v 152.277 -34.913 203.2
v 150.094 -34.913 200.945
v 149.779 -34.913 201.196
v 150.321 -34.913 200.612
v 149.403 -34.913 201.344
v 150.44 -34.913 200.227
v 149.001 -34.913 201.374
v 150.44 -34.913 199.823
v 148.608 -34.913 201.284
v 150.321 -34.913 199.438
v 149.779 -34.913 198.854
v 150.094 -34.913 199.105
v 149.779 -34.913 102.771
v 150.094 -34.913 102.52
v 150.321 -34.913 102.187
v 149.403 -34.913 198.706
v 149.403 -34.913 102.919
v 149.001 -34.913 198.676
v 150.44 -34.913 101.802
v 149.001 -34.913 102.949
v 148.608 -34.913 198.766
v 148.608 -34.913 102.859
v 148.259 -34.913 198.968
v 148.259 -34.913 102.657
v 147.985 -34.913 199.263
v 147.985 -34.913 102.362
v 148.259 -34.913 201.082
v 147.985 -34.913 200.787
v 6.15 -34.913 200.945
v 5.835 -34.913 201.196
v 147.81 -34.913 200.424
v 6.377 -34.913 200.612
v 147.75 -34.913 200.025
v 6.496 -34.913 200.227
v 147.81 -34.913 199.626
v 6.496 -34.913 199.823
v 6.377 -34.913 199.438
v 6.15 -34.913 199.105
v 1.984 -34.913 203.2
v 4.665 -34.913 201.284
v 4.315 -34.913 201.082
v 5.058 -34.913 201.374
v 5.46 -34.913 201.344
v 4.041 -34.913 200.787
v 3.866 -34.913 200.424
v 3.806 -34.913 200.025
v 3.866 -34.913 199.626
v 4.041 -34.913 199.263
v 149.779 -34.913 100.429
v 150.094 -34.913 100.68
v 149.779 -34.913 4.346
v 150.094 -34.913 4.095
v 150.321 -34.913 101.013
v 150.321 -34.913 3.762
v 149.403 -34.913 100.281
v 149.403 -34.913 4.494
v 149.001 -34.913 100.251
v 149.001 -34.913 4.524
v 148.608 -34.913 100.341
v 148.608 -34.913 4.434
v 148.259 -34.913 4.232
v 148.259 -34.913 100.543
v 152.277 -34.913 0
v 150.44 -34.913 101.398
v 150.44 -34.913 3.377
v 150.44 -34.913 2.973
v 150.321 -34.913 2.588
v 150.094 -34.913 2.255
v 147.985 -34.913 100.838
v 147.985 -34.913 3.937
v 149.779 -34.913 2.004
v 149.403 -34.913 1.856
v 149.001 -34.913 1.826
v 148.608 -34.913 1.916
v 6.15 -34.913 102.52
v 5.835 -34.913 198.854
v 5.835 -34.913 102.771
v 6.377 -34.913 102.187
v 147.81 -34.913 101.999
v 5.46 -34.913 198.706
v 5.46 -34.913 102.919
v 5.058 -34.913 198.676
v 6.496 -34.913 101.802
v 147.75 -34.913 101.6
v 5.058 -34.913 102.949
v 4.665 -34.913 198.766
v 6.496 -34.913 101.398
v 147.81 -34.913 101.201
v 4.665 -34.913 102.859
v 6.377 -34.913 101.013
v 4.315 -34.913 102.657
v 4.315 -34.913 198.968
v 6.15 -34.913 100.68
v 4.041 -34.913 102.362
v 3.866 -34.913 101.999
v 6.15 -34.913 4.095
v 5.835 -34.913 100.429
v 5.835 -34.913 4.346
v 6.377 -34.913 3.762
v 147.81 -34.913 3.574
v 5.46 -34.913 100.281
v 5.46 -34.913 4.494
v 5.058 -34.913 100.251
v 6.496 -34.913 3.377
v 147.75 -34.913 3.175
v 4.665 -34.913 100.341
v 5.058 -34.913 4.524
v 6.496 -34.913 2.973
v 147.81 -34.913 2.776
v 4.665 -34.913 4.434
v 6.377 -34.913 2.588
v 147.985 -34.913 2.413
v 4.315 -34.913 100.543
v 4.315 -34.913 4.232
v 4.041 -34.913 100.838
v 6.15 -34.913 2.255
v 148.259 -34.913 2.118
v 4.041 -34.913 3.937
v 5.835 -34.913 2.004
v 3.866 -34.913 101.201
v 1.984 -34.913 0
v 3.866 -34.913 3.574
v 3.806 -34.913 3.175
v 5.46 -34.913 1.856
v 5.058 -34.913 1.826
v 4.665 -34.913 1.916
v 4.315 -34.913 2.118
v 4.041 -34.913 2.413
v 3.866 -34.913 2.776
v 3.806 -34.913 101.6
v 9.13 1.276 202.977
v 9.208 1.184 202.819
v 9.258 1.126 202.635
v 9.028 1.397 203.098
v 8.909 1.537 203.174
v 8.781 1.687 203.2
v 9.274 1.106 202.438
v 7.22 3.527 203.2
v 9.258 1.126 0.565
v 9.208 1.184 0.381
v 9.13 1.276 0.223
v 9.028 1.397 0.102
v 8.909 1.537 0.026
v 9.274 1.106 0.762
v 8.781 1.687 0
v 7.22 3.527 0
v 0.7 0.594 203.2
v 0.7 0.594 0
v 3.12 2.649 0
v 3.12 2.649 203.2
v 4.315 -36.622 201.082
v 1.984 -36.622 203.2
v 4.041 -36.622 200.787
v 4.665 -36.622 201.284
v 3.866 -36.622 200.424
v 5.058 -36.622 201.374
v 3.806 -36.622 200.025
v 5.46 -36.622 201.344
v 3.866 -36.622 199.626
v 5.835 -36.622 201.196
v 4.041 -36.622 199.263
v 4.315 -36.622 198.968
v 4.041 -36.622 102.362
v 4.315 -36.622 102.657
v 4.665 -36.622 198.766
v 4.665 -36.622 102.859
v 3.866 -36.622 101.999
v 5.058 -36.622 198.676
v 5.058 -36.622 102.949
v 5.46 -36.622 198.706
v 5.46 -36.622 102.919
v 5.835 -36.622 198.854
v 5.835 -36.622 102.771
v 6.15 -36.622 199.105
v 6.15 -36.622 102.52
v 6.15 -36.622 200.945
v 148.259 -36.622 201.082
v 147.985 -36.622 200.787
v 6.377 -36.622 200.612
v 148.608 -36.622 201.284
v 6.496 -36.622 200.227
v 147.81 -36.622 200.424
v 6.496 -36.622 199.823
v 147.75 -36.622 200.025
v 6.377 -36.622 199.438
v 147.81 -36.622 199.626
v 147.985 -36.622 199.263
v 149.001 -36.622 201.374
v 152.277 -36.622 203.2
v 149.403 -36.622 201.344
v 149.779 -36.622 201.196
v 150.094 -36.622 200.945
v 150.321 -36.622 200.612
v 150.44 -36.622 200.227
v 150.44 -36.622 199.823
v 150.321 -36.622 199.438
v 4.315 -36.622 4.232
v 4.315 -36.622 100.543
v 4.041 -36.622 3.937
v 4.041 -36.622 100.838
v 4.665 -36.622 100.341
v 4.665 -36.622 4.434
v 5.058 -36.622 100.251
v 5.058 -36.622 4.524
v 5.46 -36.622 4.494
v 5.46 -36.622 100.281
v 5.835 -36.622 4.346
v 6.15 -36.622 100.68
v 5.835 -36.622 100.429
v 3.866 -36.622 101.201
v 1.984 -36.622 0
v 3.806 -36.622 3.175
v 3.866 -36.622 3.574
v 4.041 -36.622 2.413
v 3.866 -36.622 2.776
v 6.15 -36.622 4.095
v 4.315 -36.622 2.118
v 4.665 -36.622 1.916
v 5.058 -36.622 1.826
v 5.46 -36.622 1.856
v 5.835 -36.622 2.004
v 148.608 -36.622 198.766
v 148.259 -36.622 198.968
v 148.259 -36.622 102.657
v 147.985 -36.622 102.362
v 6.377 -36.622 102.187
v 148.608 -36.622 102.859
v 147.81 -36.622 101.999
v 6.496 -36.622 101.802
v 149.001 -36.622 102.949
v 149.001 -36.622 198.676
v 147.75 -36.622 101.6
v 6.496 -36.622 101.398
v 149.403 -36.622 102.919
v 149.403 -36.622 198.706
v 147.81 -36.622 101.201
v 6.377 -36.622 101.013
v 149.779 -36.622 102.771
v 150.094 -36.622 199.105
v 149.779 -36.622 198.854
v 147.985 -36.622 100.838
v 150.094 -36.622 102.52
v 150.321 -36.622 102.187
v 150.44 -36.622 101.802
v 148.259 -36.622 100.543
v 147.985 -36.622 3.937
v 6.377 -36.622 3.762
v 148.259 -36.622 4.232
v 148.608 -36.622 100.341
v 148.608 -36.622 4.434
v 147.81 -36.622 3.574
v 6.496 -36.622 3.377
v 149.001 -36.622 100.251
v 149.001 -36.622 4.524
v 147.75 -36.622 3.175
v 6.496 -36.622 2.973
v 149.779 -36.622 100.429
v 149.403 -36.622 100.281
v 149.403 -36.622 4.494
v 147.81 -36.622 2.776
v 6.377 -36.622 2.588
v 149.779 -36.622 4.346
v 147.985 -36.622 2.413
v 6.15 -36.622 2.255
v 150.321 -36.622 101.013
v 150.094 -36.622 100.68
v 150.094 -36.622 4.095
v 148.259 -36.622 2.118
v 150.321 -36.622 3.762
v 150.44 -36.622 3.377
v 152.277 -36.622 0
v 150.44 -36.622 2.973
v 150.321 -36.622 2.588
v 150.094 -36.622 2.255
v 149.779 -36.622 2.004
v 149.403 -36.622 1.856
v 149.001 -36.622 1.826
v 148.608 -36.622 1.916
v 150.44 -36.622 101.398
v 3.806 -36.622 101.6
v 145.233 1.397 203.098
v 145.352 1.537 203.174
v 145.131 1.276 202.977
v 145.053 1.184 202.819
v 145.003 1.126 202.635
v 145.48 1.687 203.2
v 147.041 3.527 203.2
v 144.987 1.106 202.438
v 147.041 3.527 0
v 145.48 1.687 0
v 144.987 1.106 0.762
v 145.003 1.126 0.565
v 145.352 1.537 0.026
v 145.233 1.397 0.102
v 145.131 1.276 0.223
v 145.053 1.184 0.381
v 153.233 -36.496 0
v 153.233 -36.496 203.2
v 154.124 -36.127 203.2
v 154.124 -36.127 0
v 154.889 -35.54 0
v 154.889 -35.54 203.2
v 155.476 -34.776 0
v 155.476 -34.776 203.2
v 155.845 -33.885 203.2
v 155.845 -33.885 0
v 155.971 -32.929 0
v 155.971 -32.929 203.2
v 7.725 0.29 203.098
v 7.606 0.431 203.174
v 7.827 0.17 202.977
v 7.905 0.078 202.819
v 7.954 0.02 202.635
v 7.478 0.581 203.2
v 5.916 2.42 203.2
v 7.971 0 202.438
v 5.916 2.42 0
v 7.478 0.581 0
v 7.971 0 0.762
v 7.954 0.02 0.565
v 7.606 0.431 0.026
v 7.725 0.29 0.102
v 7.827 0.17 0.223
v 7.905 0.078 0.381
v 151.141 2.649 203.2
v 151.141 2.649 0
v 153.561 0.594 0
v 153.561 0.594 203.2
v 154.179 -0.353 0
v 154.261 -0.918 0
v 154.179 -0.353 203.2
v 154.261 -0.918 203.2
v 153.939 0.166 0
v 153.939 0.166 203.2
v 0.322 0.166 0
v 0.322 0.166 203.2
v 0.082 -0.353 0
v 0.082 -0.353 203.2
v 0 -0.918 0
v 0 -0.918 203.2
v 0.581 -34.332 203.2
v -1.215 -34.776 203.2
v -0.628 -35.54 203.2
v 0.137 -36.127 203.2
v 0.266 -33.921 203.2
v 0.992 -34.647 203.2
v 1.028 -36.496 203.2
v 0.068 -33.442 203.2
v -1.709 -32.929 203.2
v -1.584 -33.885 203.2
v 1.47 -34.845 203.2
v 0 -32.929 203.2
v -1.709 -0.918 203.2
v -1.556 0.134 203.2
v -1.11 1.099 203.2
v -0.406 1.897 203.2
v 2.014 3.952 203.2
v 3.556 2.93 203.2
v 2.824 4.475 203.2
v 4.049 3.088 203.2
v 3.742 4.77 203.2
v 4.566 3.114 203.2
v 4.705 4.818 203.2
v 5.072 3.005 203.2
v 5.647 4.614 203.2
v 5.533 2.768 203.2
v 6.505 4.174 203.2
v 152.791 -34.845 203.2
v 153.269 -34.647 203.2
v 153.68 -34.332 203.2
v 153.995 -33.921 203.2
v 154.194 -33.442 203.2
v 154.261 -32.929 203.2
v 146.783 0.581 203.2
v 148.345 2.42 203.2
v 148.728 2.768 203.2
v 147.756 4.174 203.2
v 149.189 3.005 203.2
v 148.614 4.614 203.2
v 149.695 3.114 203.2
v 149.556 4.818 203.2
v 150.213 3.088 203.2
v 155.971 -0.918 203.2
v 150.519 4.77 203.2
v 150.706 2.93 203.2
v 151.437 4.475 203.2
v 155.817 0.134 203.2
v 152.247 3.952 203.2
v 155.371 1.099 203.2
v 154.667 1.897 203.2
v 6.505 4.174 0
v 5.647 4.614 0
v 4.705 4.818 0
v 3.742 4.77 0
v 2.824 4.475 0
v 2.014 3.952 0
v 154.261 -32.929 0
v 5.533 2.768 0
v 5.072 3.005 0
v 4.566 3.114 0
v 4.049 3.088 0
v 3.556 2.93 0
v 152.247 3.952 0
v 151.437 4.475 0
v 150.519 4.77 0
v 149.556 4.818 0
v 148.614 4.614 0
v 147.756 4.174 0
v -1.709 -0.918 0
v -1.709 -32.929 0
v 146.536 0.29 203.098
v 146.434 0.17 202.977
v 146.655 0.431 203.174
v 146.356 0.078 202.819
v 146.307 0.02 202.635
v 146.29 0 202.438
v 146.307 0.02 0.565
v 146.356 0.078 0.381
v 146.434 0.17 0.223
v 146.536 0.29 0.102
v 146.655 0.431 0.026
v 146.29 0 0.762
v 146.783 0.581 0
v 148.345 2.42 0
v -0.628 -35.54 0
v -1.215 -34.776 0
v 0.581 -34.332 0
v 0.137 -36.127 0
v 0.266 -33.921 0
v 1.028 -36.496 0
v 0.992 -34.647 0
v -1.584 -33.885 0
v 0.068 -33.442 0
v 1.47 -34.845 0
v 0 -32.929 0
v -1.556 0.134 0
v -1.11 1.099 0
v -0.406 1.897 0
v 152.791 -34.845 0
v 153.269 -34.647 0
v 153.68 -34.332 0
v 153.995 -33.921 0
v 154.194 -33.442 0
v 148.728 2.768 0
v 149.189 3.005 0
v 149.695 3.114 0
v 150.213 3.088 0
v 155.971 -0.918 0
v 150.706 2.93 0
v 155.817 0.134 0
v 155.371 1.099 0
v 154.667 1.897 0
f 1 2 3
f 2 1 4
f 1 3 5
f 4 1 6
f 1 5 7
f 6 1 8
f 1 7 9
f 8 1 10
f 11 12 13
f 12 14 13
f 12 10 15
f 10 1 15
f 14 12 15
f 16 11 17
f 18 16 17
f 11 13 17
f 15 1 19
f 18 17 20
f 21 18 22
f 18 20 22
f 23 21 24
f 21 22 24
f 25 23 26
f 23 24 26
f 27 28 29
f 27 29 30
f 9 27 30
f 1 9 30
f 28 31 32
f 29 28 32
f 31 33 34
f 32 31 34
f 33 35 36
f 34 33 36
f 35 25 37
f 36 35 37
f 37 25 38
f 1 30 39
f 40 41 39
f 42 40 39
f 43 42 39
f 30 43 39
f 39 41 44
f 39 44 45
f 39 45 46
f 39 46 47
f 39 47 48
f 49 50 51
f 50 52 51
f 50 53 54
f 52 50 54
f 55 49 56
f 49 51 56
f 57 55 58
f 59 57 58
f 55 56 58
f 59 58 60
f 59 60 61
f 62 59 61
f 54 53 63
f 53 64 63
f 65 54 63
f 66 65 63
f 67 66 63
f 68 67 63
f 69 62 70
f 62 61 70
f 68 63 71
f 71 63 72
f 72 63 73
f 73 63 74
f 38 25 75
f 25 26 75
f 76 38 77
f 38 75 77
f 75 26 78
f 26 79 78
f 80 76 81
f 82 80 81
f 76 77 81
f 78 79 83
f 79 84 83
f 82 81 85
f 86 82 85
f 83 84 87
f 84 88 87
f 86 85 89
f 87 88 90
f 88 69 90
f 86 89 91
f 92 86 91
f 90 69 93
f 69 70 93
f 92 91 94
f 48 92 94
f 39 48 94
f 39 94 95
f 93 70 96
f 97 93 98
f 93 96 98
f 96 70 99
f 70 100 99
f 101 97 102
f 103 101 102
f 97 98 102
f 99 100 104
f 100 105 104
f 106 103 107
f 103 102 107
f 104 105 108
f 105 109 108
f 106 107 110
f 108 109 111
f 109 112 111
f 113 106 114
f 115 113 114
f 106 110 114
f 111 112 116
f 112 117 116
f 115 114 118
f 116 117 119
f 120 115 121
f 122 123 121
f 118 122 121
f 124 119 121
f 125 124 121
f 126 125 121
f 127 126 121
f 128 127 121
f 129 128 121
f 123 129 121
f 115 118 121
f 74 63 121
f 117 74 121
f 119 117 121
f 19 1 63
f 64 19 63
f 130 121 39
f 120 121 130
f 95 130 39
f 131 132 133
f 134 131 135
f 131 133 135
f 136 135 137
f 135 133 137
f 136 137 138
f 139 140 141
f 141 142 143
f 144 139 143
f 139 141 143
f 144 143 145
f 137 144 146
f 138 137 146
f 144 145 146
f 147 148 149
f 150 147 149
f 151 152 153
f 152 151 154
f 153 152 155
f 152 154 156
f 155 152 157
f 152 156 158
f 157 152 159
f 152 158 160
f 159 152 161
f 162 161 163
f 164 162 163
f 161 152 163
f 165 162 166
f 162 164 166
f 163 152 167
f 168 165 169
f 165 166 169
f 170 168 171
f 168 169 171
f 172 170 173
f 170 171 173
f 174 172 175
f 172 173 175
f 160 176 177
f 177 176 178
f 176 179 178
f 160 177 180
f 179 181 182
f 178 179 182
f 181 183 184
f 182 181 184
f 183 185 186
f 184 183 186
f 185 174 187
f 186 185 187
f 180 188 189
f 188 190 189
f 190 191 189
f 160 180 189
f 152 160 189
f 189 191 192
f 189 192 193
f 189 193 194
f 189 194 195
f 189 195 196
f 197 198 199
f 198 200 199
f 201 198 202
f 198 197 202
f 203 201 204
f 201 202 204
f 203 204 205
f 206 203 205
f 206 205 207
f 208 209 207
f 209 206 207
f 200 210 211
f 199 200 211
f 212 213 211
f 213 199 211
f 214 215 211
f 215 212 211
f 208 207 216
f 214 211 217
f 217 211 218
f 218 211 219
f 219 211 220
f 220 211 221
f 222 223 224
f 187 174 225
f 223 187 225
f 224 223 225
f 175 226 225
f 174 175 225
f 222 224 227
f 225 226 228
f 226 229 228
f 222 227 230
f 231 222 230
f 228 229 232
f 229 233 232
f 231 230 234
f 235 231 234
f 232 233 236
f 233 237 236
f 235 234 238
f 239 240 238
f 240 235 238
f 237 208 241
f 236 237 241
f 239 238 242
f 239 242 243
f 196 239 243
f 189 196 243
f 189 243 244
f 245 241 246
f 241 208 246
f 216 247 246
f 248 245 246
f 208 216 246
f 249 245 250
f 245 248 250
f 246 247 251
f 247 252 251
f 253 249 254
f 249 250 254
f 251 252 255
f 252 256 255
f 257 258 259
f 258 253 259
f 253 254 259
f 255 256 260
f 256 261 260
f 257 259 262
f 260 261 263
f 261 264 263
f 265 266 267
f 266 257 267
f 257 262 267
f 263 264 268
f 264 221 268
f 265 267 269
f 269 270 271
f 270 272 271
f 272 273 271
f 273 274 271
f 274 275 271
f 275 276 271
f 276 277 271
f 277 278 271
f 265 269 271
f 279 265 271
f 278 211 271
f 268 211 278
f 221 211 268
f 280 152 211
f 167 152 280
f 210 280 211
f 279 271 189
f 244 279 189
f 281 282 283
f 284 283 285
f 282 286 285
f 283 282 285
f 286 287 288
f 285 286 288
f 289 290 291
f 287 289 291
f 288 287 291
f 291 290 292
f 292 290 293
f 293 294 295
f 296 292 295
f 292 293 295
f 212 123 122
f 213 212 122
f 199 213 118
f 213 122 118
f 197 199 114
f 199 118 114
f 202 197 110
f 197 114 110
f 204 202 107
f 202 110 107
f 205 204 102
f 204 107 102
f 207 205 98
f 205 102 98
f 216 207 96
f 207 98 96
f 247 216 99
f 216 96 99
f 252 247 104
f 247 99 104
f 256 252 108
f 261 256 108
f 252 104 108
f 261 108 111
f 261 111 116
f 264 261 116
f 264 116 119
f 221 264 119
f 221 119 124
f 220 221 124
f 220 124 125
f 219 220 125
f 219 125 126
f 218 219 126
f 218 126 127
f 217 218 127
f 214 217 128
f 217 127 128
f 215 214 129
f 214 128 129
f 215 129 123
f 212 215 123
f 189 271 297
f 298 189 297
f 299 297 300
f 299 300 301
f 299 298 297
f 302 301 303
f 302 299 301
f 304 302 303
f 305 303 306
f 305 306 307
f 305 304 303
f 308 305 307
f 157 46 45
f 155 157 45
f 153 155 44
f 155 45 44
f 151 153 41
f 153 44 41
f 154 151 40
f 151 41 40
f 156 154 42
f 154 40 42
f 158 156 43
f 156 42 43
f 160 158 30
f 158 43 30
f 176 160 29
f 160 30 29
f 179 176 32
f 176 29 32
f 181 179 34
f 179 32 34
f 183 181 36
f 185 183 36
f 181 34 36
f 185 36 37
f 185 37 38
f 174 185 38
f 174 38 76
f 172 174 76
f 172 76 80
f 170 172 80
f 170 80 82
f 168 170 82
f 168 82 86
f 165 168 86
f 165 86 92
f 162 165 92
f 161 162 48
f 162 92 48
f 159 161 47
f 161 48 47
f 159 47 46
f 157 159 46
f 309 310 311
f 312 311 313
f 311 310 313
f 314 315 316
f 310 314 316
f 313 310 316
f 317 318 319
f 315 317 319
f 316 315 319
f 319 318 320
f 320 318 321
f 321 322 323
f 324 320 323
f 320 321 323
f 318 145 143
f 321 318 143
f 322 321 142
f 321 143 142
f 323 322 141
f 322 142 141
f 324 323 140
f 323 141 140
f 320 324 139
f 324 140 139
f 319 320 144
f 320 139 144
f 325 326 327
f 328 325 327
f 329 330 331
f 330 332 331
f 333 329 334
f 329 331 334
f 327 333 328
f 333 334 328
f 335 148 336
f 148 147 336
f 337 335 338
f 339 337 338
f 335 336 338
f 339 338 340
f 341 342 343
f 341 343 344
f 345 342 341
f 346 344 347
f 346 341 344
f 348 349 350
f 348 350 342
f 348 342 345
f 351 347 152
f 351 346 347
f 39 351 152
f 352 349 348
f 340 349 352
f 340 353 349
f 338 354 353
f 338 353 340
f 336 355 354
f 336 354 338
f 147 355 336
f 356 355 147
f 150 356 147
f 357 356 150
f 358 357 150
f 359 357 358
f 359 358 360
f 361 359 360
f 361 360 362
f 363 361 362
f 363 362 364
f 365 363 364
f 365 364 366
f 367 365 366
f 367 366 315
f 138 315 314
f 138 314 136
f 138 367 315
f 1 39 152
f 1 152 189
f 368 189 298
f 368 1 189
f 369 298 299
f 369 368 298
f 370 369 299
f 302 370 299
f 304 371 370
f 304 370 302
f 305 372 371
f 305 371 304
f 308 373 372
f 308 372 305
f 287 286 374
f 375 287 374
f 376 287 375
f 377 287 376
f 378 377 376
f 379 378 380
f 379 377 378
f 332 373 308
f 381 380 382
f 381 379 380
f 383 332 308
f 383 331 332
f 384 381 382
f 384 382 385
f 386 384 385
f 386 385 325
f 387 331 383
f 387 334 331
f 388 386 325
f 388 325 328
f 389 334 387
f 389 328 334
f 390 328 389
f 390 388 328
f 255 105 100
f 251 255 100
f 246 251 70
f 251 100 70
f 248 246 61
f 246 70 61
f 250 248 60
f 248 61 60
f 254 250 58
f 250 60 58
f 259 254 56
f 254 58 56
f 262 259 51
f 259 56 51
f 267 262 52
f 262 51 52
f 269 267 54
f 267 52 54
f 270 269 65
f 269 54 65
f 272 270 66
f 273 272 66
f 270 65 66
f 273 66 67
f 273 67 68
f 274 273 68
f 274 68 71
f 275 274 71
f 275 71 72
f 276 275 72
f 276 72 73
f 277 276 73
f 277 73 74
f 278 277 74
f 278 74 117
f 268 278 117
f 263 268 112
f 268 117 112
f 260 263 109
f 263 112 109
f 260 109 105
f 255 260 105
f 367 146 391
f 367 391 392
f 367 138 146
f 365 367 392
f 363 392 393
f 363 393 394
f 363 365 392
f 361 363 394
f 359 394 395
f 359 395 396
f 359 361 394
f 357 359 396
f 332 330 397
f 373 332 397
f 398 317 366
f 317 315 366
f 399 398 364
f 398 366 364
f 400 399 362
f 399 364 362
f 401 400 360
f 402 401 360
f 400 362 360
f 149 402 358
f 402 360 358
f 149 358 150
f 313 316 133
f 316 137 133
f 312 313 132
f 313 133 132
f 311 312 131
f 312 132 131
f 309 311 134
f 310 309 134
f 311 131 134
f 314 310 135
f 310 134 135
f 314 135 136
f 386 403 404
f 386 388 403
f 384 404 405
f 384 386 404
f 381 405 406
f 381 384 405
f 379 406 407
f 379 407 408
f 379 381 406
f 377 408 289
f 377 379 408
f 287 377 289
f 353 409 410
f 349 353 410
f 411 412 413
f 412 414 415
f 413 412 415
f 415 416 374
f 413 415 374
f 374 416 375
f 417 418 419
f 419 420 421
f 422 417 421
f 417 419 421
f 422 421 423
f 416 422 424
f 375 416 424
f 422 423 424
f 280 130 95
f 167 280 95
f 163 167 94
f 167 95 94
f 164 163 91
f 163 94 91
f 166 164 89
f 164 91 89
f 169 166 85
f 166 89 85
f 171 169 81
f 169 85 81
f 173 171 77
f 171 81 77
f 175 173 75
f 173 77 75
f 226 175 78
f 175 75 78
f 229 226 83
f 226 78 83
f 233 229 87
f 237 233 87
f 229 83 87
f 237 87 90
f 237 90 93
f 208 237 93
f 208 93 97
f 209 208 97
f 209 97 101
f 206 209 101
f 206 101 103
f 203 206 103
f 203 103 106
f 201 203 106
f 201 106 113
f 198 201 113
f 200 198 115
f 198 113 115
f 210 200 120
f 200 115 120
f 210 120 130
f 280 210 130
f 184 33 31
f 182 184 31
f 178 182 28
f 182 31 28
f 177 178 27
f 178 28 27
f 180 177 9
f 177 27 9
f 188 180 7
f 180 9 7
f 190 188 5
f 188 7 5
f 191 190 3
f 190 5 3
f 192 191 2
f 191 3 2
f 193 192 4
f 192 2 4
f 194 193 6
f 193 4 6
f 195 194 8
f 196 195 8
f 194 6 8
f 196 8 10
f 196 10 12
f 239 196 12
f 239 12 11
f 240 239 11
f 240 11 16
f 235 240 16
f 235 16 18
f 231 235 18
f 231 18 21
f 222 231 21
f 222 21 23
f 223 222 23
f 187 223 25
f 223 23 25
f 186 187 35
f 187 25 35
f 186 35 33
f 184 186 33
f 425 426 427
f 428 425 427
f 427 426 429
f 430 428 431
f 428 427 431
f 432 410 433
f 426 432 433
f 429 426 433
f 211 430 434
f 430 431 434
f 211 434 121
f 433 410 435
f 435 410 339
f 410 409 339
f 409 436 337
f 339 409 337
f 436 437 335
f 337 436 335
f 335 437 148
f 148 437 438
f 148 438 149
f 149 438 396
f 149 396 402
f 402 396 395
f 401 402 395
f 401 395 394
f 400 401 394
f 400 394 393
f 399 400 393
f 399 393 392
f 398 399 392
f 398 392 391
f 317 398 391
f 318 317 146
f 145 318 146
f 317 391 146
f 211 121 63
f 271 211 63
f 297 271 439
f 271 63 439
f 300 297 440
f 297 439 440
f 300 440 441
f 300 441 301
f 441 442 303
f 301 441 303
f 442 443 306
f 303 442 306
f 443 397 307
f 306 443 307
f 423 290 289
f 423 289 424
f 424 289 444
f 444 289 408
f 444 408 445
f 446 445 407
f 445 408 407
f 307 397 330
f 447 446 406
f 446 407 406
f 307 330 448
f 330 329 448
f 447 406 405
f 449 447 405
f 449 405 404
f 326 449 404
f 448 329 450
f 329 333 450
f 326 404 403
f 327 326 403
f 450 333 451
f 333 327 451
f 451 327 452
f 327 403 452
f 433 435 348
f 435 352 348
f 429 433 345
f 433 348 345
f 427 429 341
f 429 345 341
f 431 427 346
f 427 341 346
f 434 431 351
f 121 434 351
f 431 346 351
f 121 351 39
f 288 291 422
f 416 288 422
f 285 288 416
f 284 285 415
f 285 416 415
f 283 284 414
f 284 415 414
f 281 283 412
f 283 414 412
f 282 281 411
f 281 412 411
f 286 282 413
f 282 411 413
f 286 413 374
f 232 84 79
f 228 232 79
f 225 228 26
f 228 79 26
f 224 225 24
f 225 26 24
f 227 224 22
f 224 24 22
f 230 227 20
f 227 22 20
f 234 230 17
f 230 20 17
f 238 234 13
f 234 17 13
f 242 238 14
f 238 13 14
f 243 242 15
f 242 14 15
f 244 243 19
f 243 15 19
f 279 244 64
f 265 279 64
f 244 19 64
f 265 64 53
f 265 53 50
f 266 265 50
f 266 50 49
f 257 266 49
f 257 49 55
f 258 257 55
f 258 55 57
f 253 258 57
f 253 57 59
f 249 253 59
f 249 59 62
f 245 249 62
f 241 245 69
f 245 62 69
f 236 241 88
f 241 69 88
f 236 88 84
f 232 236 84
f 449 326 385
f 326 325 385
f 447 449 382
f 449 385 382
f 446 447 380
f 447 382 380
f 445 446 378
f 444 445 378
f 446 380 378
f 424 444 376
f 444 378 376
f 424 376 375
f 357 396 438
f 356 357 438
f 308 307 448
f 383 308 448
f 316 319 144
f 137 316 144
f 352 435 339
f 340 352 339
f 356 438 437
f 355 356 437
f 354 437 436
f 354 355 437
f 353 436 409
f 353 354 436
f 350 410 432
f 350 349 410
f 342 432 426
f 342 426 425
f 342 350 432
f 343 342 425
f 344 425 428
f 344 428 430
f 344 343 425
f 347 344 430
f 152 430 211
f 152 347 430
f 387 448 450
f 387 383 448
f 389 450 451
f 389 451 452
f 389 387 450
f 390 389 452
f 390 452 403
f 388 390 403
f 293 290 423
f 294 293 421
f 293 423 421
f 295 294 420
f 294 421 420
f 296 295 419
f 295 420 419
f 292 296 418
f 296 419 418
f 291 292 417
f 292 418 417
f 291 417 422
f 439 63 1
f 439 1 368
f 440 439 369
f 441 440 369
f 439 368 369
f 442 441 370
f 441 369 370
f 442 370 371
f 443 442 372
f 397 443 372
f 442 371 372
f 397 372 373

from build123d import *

# Parameters (mm, degrees)
F1_DEPTH = 203.2
F2_R     = 3.69316
F3_R     = 1.98374
F4_R     = 0.762
F5_R     = 1.35255
F6_DEPTH = 1.70942


with BuildPart() as f1:
    # F0 (on Top) → F1 (new body)
    with BuildSketch(Plane.XY):
        Polygon((0, -34.912743), (0, 0), (4.632677, 3.932751), (7.97125, 0), (9.274422, 1.106282), (4.829567, 6.342205), (-1.70942, 0.791159), (-1.70942, -36.622163), (155.970525, -36.622163), (155.970525, 0.791159), (149.431538, 6.342205), (144.986683, 1.106282), (146.289855, 0), (149.628427, 3.932751), (154.261105, 0), (154.261105, -34.912743), align=None)
    extrude(amount=F1_DEPTH)

    # F2
    f2_edges = [f1.edges().sort_by_distance(p)[0] for p in [
        (149.431538, 6.342205, 101.6),
        (155.970525, 0.791159, 101.6),
        (155.970525, -36.622163, 101.6),
        (-1.70942, -36.622163, 101.6),
        (-1.70942, 0.791159, 101.6),
        (4.829567, 6.342205, 101.6),
    ]]
    fillet(f2_edges, radius=F2_R)

    # F3
    f3_edges = [f1.edges().sort_by_distance(p)[0] for p in [
        (149.628427, 3.932751, 101.6),
        (154.261105, 0, 101.6),
        (154.261105, -34.912743, 101.6),
        (0, -34.912743, 101.6),
        (0, 0, 101.6),
        (4.632677, 3.932751, 101.6),
    ]]
    fillet(f3_edges, radius=F3_R)

    # F4
    f4_edges = [f1.edges().sort_by_distance(p)[0] for p in [
        (145.638269, 0.553141, 203.2),
        (145.638269, 0.553141, 0),
        (8.622836, 0.553141, 0),
        (8.622836, 0.553141, 203.2),
    ]]
    fillet(f4_edges, radius=F4_R)

    # F5 (on face) → F6 (cut, through all)
    with BuildSketch(Plane(origin=(0, -34.912743, 0), x_dir=(-1, 0, 0), z_dir=(0, 1, 0))):
        with Locations((-5.15874, 3.175)):
            Circle(F5_R)
        with Locations((-5.15874, 101.6)):
            Circle(F5_R)
        with Locations((-5.15874, 200.025)):
            Circle(F5_R)
        with Locations((-149.102365, 200.025)):
            Circle(F5_R)
        with Locations((-149.102365, 101.6)):
            Circle(F5_R)
        with Locations((-149.102365, 3.175)):
            Circle(F5_R)
    extrude(amount=-F6_DEPTH, mode=Mode.SUBTRACT)


solid = f1.part
